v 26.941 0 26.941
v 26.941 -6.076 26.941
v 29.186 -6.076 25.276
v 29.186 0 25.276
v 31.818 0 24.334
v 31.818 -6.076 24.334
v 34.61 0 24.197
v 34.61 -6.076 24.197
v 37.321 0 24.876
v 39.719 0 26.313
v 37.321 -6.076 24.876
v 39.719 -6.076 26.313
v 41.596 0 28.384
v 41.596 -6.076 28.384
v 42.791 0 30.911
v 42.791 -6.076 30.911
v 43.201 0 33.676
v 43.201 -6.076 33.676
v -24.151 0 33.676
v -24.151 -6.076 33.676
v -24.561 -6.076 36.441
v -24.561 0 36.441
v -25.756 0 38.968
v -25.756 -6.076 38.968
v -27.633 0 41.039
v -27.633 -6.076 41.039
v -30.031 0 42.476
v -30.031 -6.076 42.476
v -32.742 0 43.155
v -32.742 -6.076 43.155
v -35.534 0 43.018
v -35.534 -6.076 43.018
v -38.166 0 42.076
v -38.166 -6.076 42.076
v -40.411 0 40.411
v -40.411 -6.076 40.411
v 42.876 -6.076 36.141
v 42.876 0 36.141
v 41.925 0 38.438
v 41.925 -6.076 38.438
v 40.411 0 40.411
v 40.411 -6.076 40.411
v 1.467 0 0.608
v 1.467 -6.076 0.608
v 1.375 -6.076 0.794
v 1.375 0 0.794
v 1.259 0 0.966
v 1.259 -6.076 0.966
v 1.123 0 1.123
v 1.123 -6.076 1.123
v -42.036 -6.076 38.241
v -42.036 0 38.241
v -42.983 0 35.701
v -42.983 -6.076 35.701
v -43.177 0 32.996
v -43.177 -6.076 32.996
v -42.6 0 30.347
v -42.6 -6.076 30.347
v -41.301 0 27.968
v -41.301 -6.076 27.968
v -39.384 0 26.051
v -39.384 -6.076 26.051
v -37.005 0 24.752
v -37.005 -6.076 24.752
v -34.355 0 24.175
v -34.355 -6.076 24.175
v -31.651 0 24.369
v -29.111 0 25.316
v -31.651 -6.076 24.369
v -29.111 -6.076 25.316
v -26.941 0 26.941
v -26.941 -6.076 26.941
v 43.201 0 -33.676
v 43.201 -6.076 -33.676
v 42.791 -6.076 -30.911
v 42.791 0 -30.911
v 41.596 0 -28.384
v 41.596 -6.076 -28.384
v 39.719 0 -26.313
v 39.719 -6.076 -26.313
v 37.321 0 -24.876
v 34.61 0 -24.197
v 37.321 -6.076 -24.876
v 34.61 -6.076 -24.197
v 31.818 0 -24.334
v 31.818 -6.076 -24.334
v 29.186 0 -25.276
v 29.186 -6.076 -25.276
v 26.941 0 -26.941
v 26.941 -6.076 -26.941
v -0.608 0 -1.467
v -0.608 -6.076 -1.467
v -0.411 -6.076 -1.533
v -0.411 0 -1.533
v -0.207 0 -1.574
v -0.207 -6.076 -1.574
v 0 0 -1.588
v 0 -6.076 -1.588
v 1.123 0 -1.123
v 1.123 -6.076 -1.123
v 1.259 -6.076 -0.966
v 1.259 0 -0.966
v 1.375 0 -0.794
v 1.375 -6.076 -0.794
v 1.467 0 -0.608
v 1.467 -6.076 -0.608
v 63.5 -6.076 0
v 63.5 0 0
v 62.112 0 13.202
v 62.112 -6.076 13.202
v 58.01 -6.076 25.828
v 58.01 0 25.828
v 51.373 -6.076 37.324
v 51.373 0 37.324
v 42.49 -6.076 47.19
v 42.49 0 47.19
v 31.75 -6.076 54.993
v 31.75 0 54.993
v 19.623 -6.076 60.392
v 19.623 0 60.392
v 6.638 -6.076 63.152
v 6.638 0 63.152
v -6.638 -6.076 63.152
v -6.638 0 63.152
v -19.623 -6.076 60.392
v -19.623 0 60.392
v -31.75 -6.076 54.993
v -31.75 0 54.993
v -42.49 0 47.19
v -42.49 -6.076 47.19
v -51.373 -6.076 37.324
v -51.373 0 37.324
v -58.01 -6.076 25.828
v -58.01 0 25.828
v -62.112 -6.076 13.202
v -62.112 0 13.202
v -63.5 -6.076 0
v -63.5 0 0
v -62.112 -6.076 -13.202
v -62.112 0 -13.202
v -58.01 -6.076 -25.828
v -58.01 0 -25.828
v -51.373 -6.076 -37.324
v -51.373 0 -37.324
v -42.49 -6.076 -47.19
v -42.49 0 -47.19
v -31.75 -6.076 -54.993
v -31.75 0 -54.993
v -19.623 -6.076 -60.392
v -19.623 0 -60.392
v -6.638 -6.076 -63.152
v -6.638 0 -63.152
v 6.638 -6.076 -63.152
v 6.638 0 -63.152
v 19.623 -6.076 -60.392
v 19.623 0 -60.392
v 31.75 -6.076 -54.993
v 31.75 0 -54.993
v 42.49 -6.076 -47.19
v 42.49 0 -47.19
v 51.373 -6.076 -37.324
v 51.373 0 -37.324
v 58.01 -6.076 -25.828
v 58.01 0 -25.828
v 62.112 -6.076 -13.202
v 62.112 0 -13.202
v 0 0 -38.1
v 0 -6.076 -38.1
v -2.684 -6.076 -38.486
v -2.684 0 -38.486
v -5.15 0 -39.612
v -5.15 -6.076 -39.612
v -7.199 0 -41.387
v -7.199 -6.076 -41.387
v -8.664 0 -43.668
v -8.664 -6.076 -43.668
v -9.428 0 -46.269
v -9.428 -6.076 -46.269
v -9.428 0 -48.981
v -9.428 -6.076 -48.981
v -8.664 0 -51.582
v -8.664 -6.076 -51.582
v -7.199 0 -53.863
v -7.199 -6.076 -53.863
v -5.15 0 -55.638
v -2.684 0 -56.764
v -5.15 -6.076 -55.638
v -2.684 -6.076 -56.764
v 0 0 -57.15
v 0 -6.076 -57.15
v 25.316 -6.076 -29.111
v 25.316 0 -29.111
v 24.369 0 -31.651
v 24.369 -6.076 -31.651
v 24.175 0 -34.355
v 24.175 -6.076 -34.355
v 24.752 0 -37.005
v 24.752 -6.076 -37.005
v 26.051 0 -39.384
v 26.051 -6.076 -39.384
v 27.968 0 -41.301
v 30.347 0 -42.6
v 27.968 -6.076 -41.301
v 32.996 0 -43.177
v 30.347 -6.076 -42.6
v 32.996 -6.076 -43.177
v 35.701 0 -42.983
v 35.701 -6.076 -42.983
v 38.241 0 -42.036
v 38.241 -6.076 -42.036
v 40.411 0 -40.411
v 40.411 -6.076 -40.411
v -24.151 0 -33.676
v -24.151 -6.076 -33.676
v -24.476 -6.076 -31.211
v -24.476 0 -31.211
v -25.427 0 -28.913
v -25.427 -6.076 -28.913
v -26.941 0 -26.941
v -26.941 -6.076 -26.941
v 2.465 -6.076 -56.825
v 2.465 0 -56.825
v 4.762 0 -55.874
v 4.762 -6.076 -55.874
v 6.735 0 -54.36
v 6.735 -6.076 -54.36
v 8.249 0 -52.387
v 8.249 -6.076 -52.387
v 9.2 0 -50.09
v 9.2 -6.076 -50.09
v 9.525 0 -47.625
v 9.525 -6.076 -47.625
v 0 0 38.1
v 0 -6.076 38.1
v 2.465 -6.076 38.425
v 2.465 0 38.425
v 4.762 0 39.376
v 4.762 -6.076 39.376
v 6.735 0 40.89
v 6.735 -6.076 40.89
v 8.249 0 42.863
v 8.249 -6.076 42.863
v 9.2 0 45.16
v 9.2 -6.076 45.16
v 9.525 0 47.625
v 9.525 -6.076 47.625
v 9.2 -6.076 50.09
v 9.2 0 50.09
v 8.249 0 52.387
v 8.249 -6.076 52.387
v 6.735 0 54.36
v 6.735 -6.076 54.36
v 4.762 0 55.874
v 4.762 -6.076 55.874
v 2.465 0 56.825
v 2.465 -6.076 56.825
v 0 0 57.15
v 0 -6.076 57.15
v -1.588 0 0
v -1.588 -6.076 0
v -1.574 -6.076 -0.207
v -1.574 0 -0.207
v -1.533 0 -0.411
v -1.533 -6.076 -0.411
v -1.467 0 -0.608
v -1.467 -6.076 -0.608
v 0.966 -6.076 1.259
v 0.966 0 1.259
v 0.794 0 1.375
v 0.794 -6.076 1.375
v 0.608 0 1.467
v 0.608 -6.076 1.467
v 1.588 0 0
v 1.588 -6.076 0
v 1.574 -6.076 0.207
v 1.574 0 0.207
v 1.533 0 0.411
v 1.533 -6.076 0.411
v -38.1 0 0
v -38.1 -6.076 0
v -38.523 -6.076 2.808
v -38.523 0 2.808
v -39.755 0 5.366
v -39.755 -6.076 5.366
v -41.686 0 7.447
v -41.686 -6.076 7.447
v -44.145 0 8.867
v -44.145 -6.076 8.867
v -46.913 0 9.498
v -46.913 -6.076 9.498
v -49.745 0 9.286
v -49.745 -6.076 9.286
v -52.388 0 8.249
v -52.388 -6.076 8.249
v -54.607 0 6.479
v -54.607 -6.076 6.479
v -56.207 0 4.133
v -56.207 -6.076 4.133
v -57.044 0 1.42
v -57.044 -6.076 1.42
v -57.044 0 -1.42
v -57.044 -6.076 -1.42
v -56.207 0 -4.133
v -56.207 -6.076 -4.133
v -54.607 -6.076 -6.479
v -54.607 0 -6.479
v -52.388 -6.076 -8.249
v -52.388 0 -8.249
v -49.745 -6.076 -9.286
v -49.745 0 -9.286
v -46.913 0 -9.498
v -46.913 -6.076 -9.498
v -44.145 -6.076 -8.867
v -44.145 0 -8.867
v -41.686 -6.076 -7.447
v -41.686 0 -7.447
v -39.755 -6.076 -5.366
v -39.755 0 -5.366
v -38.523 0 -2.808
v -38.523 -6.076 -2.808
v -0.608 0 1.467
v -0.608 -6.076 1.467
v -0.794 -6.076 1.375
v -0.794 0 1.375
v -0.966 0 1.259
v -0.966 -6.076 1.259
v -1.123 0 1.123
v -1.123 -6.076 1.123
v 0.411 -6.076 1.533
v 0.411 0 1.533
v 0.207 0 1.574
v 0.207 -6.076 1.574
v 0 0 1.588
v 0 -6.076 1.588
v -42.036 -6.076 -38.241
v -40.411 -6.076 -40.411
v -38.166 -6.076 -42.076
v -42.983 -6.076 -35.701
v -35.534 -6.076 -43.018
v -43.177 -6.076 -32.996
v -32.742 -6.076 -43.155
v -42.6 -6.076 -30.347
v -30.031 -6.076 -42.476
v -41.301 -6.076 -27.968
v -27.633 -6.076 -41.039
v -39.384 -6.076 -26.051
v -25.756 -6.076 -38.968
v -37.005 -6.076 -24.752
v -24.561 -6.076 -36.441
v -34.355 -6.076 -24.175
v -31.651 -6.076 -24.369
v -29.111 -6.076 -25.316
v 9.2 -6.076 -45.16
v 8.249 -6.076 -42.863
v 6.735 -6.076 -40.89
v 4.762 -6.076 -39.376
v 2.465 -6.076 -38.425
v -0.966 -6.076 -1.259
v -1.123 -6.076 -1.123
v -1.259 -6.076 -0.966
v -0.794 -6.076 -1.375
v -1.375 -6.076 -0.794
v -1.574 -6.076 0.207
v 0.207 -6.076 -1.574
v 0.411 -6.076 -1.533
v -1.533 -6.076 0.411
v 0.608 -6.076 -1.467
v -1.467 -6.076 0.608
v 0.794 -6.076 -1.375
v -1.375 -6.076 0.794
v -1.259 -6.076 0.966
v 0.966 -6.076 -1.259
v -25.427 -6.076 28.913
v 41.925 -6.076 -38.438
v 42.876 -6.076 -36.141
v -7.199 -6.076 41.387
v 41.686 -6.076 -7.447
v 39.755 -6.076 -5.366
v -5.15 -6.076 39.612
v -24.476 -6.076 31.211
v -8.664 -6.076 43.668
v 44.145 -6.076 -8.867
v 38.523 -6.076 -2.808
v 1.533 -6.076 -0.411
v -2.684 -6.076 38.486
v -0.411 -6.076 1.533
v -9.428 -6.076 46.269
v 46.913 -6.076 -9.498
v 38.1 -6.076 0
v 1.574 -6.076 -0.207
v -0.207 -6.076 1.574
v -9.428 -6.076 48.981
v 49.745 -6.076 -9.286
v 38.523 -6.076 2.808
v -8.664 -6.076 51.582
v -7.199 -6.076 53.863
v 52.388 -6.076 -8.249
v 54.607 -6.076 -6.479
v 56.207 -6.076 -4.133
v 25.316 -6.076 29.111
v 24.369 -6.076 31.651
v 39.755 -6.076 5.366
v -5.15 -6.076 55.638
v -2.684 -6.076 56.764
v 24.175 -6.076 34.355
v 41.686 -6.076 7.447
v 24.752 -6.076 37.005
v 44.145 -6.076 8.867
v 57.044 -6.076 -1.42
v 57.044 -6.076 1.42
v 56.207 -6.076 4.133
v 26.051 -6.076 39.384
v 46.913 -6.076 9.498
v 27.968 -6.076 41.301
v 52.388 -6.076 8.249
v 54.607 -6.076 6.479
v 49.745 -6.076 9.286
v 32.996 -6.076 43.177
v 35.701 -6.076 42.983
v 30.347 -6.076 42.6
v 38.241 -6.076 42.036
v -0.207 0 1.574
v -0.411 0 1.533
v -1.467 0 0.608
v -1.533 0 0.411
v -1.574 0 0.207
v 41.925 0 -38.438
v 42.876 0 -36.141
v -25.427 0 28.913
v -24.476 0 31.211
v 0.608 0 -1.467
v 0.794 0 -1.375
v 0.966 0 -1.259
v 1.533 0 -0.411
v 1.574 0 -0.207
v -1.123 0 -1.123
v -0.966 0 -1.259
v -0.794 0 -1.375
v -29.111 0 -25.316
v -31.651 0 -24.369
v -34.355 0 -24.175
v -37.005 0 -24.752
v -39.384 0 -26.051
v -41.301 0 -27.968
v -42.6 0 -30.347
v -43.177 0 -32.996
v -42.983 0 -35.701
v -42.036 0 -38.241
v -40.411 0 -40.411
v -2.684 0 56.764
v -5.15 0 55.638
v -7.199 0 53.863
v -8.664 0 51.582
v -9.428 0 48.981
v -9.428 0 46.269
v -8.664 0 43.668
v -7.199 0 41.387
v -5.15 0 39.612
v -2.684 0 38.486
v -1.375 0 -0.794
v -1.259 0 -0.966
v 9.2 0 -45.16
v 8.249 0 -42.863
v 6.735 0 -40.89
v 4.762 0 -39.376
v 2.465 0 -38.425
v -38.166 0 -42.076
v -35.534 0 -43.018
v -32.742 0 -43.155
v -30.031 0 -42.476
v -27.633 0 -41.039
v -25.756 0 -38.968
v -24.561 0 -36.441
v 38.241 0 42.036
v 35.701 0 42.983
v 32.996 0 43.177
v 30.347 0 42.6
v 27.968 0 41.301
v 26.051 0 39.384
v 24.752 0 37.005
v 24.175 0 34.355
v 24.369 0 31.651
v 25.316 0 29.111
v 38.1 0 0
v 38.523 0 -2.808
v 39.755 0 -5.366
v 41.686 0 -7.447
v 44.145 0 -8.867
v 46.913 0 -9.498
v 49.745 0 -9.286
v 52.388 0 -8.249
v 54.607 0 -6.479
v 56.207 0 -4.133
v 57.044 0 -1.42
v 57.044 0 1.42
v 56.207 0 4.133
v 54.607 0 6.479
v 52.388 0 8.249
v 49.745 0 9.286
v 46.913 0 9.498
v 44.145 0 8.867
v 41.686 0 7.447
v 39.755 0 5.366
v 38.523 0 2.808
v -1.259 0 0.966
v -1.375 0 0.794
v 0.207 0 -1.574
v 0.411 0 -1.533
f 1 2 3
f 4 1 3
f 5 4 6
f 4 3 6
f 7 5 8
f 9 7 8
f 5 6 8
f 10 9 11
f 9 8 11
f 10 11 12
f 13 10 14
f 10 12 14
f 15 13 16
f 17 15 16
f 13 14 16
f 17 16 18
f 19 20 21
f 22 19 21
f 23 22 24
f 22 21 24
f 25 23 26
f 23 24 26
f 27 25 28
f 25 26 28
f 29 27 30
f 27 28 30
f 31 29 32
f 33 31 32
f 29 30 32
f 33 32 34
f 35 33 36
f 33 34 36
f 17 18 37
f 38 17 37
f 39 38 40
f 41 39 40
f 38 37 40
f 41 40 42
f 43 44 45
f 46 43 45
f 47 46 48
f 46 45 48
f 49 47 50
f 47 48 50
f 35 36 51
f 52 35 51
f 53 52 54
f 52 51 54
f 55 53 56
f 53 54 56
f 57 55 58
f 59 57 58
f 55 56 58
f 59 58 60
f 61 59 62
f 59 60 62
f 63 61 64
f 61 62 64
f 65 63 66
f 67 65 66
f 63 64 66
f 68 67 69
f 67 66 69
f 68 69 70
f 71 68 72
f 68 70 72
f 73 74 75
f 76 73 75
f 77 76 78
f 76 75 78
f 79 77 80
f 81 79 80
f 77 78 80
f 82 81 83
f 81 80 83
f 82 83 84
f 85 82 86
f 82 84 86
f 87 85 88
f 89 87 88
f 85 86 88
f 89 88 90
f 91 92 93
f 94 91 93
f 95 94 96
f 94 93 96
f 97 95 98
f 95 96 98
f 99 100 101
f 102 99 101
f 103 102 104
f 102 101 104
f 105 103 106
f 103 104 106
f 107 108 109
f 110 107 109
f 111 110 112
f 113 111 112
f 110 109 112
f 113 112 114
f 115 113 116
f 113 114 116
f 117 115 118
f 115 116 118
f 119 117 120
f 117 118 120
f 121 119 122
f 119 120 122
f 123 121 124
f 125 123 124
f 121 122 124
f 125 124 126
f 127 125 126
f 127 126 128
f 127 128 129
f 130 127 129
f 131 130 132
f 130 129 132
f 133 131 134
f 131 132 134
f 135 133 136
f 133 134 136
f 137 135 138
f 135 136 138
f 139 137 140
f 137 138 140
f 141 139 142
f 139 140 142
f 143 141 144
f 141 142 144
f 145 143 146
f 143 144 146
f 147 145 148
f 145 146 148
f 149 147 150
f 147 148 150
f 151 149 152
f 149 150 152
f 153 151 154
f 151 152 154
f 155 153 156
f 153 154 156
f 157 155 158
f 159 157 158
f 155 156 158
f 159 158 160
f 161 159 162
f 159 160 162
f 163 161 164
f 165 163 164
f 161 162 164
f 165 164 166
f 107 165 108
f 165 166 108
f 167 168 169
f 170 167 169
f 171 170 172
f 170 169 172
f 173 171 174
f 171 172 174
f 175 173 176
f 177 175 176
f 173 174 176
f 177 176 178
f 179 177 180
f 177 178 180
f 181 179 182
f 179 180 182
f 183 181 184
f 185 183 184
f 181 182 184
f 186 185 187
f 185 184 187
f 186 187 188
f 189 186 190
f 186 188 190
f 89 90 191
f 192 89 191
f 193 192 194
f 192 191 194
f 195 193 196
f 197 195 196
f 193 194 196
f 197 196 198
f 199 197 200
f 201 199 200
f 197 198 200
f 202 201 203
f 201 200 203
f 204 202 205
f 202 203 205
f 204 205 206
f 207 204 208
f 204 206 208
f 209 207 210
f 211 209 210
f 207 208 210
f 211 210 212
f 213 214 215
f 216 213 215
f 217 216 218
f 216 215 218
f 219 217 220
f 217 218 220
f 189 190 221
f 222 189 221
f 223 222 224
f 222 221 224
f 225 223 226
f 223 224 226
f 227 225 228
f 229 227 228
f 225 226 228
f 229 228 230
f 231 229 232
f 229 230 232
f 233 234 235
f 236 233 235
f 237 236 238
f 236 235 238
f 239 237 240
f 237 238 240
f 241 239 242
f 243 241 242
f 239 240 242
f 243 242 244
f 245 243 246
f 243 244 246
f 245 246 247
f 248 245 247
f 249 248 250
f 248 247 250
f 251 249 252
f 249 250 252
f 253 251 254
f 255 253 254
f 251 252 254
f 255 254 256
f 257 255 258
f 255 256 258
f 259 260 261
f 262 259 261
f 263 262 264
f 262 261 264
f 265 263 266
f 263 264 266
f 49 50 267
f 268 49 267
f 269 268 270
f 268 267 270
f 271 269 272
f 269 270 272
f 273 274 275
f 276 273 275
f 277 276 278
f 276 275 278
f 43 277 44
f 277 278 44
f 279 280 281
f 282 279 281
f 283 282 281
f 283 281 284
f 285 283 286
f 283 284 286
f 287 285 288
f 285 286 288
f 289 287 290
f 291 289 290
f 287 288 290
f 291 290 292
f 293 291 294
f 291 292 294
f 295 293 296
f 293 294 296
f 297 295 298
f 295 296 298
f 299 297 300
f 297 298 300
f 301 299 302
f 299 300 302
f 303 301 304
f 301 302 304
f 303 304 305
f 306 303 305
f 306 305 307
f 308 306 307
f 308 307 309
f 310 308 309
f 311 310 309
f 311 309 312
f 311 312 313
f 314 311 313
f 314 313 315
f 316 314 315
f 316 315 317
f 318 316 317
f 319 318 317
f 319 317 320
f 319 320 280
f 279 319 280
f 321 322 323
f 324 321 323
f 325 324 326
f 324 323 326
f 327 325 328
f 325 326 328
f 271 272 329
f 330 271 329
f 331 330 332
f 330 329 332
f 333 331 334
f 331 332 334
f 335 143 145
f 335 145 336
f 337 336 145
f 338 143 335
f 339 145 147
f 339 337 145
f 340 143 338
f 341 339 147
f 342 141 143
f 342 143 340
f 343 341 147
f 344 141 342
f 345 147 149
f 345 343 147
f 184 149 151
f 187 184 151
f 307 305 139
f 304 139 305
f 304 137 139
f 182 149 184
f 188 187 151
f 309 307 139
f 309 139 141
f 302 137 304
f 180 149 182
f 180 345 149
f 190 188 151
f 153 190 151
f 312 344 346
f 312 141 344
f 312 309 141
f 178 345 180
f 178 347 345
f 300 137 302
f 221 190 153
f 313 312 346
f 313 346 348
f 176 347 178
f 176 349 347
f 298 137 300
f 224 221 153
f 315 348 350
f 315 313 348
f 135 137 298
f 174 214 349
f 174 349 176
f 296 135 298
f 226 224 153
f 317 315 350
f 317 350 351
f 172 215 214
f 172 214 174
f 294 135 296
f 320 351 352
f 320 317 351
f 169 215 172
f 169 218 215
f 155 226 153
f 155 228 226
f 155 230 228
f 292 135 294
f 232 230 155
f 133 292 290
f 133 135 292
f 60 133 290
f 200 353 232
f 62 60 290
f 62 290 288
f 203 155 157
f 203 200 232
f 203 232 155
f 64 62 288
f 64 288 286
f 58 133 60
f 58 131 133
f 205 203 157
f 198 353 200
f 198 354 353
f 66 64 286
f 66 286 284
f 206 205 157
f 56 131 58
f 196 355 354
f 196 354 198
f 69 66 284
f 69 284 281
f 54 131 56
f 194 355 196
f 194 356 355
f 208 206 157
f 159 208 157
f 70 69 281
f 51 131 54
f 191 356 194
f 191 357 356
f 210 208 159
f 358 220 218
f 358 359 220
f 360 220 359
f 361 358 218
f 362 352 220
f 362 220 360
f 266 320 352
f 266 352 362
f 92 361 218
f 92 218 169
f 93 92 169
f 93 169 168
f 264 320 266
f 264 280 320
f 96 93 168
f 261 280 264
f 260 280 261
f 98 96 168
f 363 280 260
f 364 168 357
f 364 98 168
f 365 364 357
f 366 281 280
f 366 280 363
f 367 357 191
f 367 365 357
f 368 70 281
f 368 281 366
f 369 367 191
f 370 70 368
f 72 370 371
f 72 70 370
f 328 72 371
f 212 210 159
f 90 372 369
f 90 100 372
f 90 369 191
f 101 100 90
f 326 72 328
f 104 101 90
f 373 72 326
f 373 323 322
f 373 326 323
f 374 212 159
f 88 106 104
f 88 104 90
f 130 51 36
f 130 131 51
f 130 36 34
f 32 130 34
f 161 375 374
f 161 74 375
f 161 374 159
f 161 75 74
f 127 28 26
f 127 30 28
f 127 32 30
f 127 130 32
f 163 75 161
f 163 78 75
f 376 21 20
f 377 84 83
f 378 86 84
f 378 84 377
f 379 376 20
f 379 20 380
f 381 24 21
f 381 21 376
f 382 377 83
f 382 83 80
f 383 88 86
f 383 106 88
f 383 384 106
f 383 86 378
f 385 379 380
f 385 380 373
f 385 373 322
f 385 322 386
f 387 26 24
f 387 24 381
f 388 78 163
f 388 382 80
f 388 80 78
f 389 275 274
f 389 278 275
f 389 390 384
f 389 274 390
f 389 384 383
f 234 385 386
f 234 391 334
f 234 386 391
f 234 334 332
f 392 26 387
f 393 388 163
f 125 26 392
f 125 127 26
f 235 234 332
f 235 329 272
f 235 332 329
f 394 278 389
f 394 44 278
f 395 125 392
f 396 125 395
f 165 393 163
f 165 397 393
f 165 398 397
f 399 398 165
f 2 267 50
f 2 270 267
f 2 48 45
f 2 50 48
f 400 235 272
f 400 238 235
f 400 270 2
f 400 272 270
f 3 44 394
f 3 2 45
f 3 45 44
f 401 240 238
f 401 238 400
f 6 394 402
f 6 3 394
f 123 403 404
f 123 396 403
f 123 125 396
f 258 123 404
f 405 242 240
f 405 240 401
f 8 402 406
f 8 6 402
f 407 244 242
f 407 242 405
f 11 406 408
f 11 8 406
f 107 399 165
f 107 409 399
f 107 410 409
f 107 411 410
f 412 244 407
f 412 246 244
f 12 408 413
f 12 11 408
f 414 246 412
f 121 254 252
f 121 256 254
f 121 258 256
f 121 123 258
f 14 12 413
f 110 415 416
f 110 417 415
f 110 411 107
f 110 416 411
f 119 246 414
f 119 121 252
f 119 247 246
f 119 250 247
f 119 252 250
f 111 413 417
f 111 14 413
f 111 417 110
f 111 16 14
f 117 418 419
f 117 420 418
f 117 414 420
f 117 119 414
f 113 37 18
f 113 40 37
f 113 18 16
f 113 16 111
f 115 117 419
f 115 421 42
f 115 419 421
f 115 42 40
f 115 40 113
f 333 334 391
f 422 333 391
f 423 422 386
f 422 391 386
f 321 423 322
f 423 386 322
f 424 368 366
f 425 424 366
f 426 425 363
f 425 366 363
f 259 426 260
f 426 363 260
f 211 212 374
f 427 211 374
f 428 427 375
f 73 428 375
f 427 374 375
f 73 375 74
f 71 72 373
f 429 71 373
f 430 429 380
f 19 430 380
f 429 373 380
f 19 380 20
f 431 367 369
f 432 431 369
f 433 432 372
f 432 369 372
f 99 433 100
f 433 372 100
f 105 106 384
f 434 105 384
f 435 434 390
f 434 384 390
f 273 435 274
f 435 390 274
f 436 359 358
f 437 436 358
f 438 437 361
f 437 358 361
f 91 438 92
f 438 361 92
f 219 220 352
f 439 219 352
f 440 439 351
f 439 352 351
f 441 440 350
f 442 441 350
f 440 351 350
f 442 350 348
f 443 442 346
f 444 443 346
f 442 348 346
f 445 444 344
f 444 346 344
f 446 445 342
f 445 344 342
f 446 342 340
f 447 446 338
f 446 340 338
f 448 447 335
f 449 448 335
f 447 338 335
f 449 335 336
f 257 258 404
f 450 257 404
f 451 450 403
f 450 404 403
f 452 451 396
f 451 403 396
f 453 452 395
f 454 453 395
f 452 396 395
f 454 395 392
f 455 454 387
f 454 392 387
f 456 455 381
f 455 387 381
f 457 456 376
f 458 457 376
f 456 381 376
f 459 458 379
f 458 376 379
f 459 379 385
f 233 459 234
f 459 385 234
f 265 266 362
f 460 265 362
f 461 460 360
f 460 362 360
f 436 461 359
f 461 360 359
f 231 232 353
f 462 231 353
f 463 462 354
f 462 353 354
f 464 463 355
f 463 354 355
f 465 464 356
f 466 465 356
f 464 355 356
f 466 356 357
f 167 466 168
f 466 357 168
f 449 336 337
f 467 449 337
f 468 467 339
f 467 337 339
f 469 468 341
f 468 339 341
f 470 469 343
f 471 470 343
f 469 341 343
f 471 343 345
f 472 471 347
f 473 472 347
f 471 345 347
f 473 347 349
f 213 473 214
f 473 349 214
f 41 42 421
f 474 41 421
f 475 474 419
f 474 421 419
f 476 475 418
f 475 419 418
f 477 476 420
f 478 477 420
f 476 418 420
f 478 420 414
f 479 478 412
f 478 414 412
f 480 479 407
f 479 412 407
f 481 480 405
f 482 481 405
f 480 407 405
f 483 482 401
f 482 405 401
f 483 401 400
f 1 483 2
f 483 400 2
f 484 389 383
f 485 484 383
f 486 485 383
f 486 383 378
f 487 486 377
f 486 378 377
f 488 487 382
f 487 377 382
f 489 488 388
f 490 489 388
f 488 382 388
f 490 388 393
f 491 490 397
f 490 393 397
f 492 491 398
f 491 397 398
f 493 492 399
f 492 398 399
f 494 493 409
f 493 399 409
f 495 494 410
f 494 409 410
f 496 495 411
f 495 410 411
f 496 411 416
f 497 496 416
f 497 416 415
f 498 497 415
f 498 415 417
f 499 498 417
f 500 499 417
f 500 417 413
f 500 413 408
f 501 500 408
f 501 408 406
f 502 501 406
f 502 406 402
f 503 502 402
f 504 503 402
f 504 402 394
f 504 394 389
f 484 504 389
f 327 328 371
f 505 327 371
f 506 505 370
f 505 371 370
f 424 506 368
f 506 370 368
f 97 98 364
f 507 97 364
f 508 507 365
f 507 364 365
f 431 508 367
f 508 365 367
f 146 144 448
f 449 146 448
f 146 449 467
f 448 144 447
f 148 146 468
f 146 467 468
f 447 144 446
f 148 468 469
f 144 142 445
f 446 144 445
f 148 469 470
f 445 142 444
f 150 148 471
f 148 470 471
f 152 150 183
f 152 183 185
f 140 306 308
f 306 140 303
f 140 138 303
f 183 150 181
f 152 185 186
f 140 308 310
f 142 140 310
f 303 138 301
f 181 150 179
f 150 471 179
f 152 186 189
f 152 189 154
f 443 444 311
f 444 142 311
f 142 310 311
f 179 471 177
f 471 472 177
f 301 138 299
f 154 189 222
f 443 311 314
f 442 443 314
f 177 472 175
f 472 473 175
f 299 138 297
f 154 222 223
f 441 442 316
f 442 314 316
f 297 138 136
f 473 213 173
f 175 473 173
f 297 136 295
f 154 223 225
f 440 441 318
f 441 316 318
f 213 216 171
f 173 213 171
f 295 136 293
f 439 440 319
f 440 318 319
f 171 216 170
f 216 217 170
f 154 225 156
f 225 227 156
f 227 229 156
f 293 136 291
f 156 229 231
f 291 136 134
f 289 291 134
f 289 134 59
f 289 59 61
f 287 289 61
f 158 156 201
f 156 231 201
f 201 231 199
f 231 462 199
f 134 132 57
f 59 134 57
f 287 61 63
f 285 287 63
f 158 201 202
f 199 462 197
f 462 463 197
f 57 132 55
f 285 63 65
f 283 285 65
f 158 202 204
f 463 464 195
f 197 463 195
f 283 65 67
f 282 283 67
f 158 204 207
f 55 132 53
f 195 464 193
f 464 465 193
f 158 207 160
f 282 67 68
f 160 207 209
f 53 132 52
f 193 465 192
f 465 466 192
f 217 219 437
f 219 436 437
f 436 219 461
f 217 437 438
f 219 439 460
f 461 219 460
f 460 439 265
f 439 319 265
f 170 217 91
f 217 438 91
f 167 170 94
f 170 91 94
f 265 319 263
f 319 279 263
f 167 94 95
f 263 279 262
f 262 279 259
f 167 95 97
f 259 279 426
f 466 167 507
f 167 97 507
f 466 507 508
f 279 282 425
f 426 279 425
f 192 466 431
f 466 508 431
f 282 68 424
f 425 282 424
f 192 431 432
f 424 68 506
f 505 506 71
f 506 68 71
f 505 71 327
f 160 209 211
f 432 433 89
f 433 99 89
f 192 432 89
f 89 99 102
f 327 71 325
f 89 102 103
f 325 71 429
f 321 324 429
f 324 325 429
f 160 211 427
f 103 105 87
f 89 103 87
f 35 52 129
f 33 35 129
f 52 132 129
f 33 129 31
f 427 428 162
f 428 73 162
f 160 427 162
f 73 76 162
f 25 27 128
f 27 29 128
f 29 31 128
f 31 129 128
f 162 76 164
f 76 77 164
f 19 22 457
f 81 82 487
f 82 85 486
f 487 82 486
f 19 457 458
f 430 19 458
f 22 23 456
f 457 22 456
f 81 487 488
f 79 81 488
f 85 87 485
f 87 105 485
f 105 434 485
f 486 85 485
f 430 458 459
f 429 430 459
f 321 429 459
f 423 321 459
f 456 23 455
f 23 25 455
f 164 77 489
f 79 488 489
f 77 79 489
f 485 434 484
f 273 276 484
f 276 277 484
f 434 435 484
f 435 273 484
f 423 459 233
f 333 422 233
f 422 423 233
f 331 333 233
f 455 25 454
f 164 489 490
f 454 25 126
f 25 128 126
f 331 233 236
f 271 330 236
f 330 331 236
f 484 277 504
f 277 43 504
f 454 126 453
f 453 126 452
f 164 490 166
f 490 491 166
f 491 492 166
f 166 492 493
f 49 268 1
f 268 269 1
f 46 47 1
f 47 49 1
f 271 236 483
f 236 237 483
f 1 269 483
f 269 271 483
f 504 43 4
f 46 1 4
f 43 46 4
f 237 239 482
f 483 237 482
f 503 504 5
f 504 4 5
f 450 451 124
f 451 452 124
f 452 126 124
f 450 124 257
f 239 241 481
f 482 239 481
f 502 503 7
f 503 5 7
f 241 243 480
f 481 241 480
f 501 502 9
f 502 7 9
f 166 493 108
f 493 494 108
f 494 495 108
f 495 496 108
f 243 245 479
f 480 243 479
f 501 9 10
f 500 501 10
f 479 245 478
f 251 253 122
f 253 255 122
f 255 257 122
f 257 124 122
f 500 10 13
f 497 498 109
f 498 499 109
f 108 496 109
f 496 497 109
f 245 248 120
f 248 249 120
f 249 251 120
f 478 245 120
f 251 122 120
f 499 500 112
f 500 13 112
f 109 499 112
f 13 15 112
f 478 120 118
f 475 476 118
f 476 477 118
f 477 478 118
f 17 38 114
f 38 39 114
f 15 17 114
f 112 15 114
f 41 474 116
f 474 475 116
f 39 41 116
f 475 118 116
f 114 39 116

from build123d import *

# Parameters (mm, degrees)
F0_R     = 63.5
F1_DEPTH = 6.07568
F3_DEPTH = 25.4
F4_DEPTH = 25.4


with BuildPart() as f1:
    # F0 (on Front) → F1 (new body)
    with BuildSketch(Plane.XZ):
        Circle(F0_R)
    extrude(amount=F1_DEPTH)

    # F2 (on face) → F3 (cut)
    with BuildSketch(Plane.XZ.offset(6.07568)):
        with BuildLine():
            Line((0, 0), (1.5875, 0))
            ThreePointArc((1.5875, 0), (1.556997, 0.309706), (1.466659, 0.60751))
            Line((1.466659, 0.60751), (0, 0))
        make_face()
        with BuildLine():
            ThreePointArc((43.20096, -33.67596), (37.32102, -24.876008), (26.940768, -26.940768))
            Line((26.940768, -26.940768), (40.411153, -40.411153))
            ThreePointArc((40.411153, -40.411153), (42.475913, -37.32102), (43.20096, -33.67596))
        make_face()
        with BuildLine():
            Line((40.411153, -40.411153), (26.940768, -26.940768))
            ThreePointArc((26.940768, -26.940768), (26.940768, -40.411153), (40.411153, -40.411153))
        make_face()
        with BuildLine():
            ThreePointArc((9.525, -47.625), (6.735192, -40.889808), (0, -38.1))
            Line((0, -38.1), (0, -57.15))
            ThreePointArc((0, -57.15), (6.735192, -54.360192), (9.525, -47.625))
        make_face()
        with BuildLine():
            Line((0, -57.15), (0, -38.1))
            ThreePointArc((0, -38.1), (-9.525, -47.625), (0, -57.15))
        make_face()
        with BuildLine():
            ThreePointArc((-24.15096, -33.67596), (-24.876008, -30.030901), (-26.940768, -26.940768))
            Line((-26.940768, -26.940768), (-40.411153, -40.411153))
            ThreePointArc((-40.411153, -40.411153), (-30.030901, -42.475913), (-24.15096, -33.67596))
        make_face()
        with BuildLine():
            Line((-40.411153, -40.411153), (-26.940768, -26.940768))
            ThreePointArc((-26.940768, -26.940768), (-40.411153, -26.940768), (-40.411153, -40.411153))
        make_face()
        with BuildLine():
            ThreePointArc((-57.15, 0), (-47.625, -9.525), (-38.1, 0))
            Line((-38.1, 0), (-57.15, 0))
        make_face()
        with BuildLine():
            Line((-57.15, 0), (-38.1, 0))
            ThreePointArc((-38.1, 0), (-47.625, 9.525), (-57.15, 0))
        make_face()
        with BuildLine():
            ThreePointArc((-40.411153, 40.411153), (-40.411153, 26.940768), (-26.940768, 26.940768))
            Line((-26.940768, 26.940768), (-40.411153, 40.411153))
        make_face()
        with BuildLine():
            Line((-40.411153, 40.411153), (-26.940768, 26.940768))
            ThreePointArc((-26.940768, 26.940768), (-24.876008, 30.030901), (-24.15096, 33.67596))
            ThreePointArc((-24.15096, 33.67596), (-30.030901, 42.475913), (-40.411153, 40.411153))
        make_face()
        with BuildLine():
            ThreePointArc((0, 57.15), (-9.525, 47.625), (0, 38.1))
            Line((0, 38.1), (0, 57.15))
        make_face()
        with BuildLine():
            Line((0, 57.15), (0, 38.1))
            ThreePointArc((0, 38.1), (6.735192, 40.889808), (9.525, 47.625))
            ThreePointArc((9.525, 47.625), (6.735192, 54.360192), (0, 57.15))
        make_face()
        with BuildLine():
            ThreePointArc((40.411153, 40.411153), (26.940768, 40.411153), (26.940768, 26.940768))
            Line((26.940768, 26.940768), (40.411153, 40.411153))
        make_face()
        with BuildLine():
            Line((40.411153, 40.411153), (26.940768, 26.940768))
            ThreePointArc((26.940768, 26.940768), (37.32102, 24.876008), (43.20096, 33.67596))
            ThreePointArc((43.20096, 33.67596), (42.475913, 37.32102), (40.411153, 40.411153))
        make_face()
        with BuildLine():
            ThreePointArc((57.15, 0), (47.625, 9.525), (38.1, 0))
            Line((38.1, 0), (57.15, 0))
        make_face()
        with BuildLine():
            Line((57.15, 0), (38.1, 0))
            ThreePointArc((38.1, 0), (47.625, -9.525), (57.15, 0))
        make_face()
        with BuildLine():
            ThreePointArc((1.466659, -0.60751), (1.556997, -0.309706), (1.5875, 0))
            Line((1.5875, 0), (0, 0))
            Line((0, 0), (1.466659, -0.60751))
        make_face()
        with BuildLine():
            Line((0, 0), (1.466659, 0.60751))
            ThreePointArc((1.466659, 0.60751), (1.319958, 0.881968), (1.122532, 1.122532))
            Line((1.122532, 1.122532), (0, 0))
        make_face()
        with BuildLine():
            ThreePointArc((1.122532, -1.122532), (1.319958, -0.881968), (1.466659, -0.60751))
            Line((1.466659, -0.60751), (0, 0))
            Line((0, 0), (1.122532, -1.122532))
        make_face()
        with BuildLine():
            Line((-1.466659, -0.60751), (0, 0))
            Line((0, 0), (-1.5875, 0))
            ThreePointArc((-1.5875, 0), (-1.556997, -0.309706), (-1.466659, -0.60751))
        make_face()
        with BuildLine():
            Line((-0.60751, 1.466659), (0, 0))
            Line((0, 0), (0, 1.5875))
            ThreePointArc((0, 1.5875), (-0.309706, 1.556997), (-0.60751, 1.466659))
        make_face()
        with BuildLine():
            Line((0.60751, -1.466659), (0, 0))
            Line((0, 0), (0, -1.5875))
            ThreePointArc((0, -1.5875), (0.309706, -1.556997), (0.60751, -1.466659))
        make_face()
        with BuildLine():
            Line((-1.466659, 0.60751), (0, 0))
            Line((0, 0), (-1.122532, 1.122532))
            ThreePointArc((-1.122532, 1.122532), (-1.319958, 0.881968), (-1.466659, 0.60751))
        make_face()
        with BuildLine():
            Line((0.60751, 1.466659), (0, 0))
            Line((0, 0), (1.122532, 1.122532))
            ThreePointArc((1.122532, 1.122532), (0.881968, 1.319958), (0.60751, 1.466659))
        make_face()
        with BuildLine():
            Line((-0.60751, -1.466659), (0, 0))
            Line((0, 0), (-1.122532, -1.122532))
            ThreePointArc((-1.122532, -1.122532), (-0.881968, -1.319958), (-0.60751, -1.466659))
        make_face()
        with BuildLine():
            Line((-1.122532, -1.122532), (0, 0))
            Line((0, 0), (-1.466659, -0.60751))
            ThreePointArc((-1.466659, -0.60751), (-1.319958, -0.881968), (-1.122532, -1.122532))
        make_face()
        with BuildLine():
            Line((0, -1.5875), (0, 0))
            Line((0, 0), (-0.60751, -1.466659))
            ThreePointArc((-0.60751, -1.466659), (-0.309706, -1.556997), (0, -1.5875))
        make_face()
        with BuildLine():
            Line((1.122532, -1.122532), (0, 0))
            Line((0, 0), (0.60751, -1.466659))
            ThreePointArc((0.60751, -1.466659), (0.881968, -1.319958), (1.122532, -1.122532))
        make_face()
        with BuildLine():
            Line((0, 1.5875), (0, 0))
            Line((0, 0), (0.60751, 1.466659))
            ThreePointArc((0.60751, 1.466659), (0.309706, 1.556997), (0, 1.5875))
        make_face()
        with BuildLine():
            Line((-1.122532, 1.122532), (0, 0))
            Line((0, 0), (-0.60751, 1.466659))
            ThreePointArc((-0.60751, 1.466659), (-0.881968, 1.319958), (-1.122532, 1.122532))
        make_face()
        with BuildLine():
            Line((-1.5875, 0), (0, 0))
            Line((0, 0), (-1.466659, 0.60751))
            ThreePointArc((-1.466659, 0.60751), (-1.556997, 0.309706), (-1.5875, 0))
        make_face()
    extrude(amount=-F3_DEPTH, mode=Mode.SUBTRACT)

    # F2 (on face) → F4 (cut)
    with BuildSketch(Plane.XZ.offset(6.07568)):
        with BuildLine():
            Line((0, 0), (1.5875, 0))
            ThreePointArc((1.5875, 0), (1.556997, 0.309706), (1.466659, 0.60751))
            Line((1.466659, 0.60751), (0, 0))
        make_face()
        with BuildLine():
            ThreePointArc((43.20096, -33.67596), (37.32102, -24.876008), (26.940768, -26.940768))
            Line((26.940768, -26.940768), (40.411153, -40.411153))
            ThreePointArc((40.411153, -40.411153), (42.475913, -37.32102), (43.20096, -33.67596))
        make_face()
        with BuildLine():
            Line((40.411153, -40.411153), (26.940768, -26.940768))
            ThreePointArc((26.940768, -26.940768), (26.940768, -40.411153), (40.411153, -40.411153))
        make_face()
        with BuildLine():
            ThreePointArc((9.525, -47.625), (6.735192, -40.889808), (0, -38.1))
            Line((0, -38.1), (0, -57.15))
            ThreePointArc((0, -57.15), (6.735192, -54.360192), (9.525, -47.625))
        make_face()
        with BuildLine():
            Line((0, -57.15), (0, -38.1))
            ThreePointArc((0, -38.1), (-9.525, -47.625), (0, -57.15))
        make_face()
        with BuildLine():
            ThreePointArc((-24.15096, -33.67596), (-24.876008, -30.030901), (-26.940768, -26.940768))
            Line((-26.940768, -26.940768), (-40.411153, -40.411153))
            ThreePointArc((-40.411153, -40.411153), (-30.030901, -42.475913), (-24.15096, -33.67596))
        make_face()
        with BuildLine():
            Line((-40.411153, -40.411153), (-26.940768, -26.940768))
            ThreePointArc((-26.940768, -26.940768), (-40.411153, -26.940768), (-40.411153, -40.411153))
        make_face()
        with BuildLine():
            ThreePointArc((-57.15, 0), (-47.625, -9.525), (-38.1, 0))
            Line((-38.1, 0), (-57.15, 0))
        make_face()
        with BuildLine():
            Line((-57.15, 0), (-38.1, 0))
            ThreePointArc((-38.1, 0), (-47.625, 9.525), (-57.15, 0))
        make_face()
        with BuildLine():
            ThreePointArc((-40.411153, 40.411153), (-40.411153, 26.940768), (-26.940768, 26.940768))
            Line((-26.940768, 26.940768), (-40.411153, 40.411153))
        make_face()
        with BuildLine():
            Line((-40.411153, 40.411153), (-26.940768, 26.940768))
            ThreePointArc((-26.940768, 26.940768), (-24.876008, 30.030901), (-24.15096, 33.67596))
            ThreePointArc((-24.15096, 33.67596), (-30.030901, 42.475913), (-40.411153, 40.411153))
        make_face()
        with BuildLine():
            ThreePointArc((0, 57.15), (-9.525, 47.625), (0, 38.1))
            Line((0, 38.1), (0, 57.15))
        make_face()
        with BuildLine():
            Line((0, 57.15), (0, 38.1))
            ThreePointArc((0, 38.1), (6.735192, 40.889808), (9.525, 47.625))
            ThreePointArc((9.525, 47.625), (6.735192, 54.360192), (0, 57.15))
        make_face()
        with BuildLine():
            ThreePointArc((40.411153, 40.411153), (26.940768, 40.411153), (26.940768, 26.940768))
            Line((26.940768, 26.940768), (40.411153, 40.411153))
        make_face()
        with BuildLine():
            Line((40.411153, 40.411153), (26.940768, 26.940768))
            ThreePointArc((26.940768, 26.940768), (37.32102, 24.876008), (43.20096, 33.67596))
            ThreePointArc((43.20096, 33.67596), (42.475913, 37.32102), (40.411153, 40.411153))
        make_face()
        with BuildLine():
            ThreePointArc((57.15, 0), (47.625, 9.525), (38.1, 0))
            Line((38.1, 0), (57.15, 0))
        make_face()
        with BuildLine():
            Line((57.15, 0), (38.1, 0))
            ThreePointArc((38.1, 0), (47.625, -9.525), (57.15, 0))
        make_face()
        with BuildLine():
            ThreePointArc((1.466659, -0.60751), (1.556997, -0.309706), (1.5875, 0))
            Line((1.5875, 0), (0, 0))
            Line((0, 0), (1.466659, -0.60751))
        make_face()
        with BuildLine():
            Line((0, 0), (1.466659, 0.60751))
            ThreePointArc((1.466659, 0.60751), (1.319958, 0.881968), (1.122532, 1.122532))
            Line((1.122532, 1.122532), (0, 0))
        make_face()
        with BuildLine():
            ThreePointArc((1.122532, -1.122532), (1.319958, -0.881968), (1.466659, -0.60751))
            Line((1.466659, -0.60751), (0, 0))
            Line((0, 0), (1.122532, -1.122532))
        make_face()
        with BuildLine():
            Line((-1.466659, -0.60751), (0, 0))
            Line((0, 0), (-1.5875, 0))
            ThreePointArc((-1.5875, 0), (-1.556997, -0.309706), (-1.466659, -0.60751))
        make_face()
        with BuildLine():
            Line((-0.60751, 1.466659), (0, 0))
            Line((0, 0), (0, 1.5875))
            ThreePointArc((0, 1.5875), (-0.309706, 1.556997), (-0.60751, 1.466659))
        make_face()
        with BuildLine():
            Line((0.60751, -1.466659), (0, 0))
            Line((0, 0), (0, -1.5875))
            ThreePointArc((0, -1.5875), (0.309706, -1.556997), (0.60751, -1.466659))
        make_face()
        with BuildLine():
            Line((-1.466659, 0.60751), (0, 0))
            Line((0, 0), (-1.122532, 1.122532))
            ThreePointArc((-1.122532, 1.122532), (-1.319958, 0.881968), (-1.466659, 0.60751))
        make_face()
        with BuildLine():
            Line((0.60751, 1.466659), (0, 0))
            Line((0, 0), (1.122532, 1.122532))
            ThreePointArc((1.122532, 1.122532), (0.881968, 1.319958), (0.60751, 1.466659))
        make_face()
        with BuildLine():
            Line((-0.60751, -1.466659), (0, 0))
            Line((0, 0), (-1.122532, -1.122532))
            ThreePointArc((-1.122532, -1.122532), (-0.881968, -1.319958), (-0.60751, -1.466659))
        make_face()
        with BuildLine():
            Line((-1.122532, -1.122532), (0, 0))
            Line((0, 0), (-1.466659, -0.60751))
            ThreePointArc((-1.466659, -0.60751), (-1.319958, -0.881968), (-1.122532, -1.122532))
        make_face()
        with BuildLine():
            Line((0, -1.5875), (0, 0))
            Line((0, 0), (-0.60751, -1.466659))
            ThreePointArc((-0.60751, -1.466659), (-0.309706, -1.556997), (0, -1.5875))
        make_face()
        with BuildLine():
            Line((1.122532, -1.122532), (0, 0))
            Line((0, 0), (0.60751, -1.466659))
            ThreePointArc((0.60751, -1.466659), (0.881968, -1.319958), (1.122532, -1.122532))
        make_face()
        with BuildLine():
            Line((0, 1.5875), (0, 0))
            Line((0, 0), (0.60751, 1.466659))
            ThreePointArc((0.60751, 1.466659), (0.309706, 1.556997), (0, 1.5875))
        make_face()
        with BuildLine():
            Line((-1.122532, 1.122532), (0, 0))
            Line((0, 0), (-0.60751, 1.466659))
            ThreePointArc((-0.60751, 1.466659), (-0.881968, 1.319958), (-1.122532, 1.122532))
        make_face()
        with BuildLine():
            Line((-1.5875, 0), (0, 0))
            Line((0, 0), (-1.466659, 0.60751))
            ThreePointArc((-1.466659, 0.60751), (-1.556997, 0.309706), (-1.5875, 0))
        make_face()
    extrude(amount=-F4_DEPTH, mode=Mode.SUBTRACT)


solid = f1.part
